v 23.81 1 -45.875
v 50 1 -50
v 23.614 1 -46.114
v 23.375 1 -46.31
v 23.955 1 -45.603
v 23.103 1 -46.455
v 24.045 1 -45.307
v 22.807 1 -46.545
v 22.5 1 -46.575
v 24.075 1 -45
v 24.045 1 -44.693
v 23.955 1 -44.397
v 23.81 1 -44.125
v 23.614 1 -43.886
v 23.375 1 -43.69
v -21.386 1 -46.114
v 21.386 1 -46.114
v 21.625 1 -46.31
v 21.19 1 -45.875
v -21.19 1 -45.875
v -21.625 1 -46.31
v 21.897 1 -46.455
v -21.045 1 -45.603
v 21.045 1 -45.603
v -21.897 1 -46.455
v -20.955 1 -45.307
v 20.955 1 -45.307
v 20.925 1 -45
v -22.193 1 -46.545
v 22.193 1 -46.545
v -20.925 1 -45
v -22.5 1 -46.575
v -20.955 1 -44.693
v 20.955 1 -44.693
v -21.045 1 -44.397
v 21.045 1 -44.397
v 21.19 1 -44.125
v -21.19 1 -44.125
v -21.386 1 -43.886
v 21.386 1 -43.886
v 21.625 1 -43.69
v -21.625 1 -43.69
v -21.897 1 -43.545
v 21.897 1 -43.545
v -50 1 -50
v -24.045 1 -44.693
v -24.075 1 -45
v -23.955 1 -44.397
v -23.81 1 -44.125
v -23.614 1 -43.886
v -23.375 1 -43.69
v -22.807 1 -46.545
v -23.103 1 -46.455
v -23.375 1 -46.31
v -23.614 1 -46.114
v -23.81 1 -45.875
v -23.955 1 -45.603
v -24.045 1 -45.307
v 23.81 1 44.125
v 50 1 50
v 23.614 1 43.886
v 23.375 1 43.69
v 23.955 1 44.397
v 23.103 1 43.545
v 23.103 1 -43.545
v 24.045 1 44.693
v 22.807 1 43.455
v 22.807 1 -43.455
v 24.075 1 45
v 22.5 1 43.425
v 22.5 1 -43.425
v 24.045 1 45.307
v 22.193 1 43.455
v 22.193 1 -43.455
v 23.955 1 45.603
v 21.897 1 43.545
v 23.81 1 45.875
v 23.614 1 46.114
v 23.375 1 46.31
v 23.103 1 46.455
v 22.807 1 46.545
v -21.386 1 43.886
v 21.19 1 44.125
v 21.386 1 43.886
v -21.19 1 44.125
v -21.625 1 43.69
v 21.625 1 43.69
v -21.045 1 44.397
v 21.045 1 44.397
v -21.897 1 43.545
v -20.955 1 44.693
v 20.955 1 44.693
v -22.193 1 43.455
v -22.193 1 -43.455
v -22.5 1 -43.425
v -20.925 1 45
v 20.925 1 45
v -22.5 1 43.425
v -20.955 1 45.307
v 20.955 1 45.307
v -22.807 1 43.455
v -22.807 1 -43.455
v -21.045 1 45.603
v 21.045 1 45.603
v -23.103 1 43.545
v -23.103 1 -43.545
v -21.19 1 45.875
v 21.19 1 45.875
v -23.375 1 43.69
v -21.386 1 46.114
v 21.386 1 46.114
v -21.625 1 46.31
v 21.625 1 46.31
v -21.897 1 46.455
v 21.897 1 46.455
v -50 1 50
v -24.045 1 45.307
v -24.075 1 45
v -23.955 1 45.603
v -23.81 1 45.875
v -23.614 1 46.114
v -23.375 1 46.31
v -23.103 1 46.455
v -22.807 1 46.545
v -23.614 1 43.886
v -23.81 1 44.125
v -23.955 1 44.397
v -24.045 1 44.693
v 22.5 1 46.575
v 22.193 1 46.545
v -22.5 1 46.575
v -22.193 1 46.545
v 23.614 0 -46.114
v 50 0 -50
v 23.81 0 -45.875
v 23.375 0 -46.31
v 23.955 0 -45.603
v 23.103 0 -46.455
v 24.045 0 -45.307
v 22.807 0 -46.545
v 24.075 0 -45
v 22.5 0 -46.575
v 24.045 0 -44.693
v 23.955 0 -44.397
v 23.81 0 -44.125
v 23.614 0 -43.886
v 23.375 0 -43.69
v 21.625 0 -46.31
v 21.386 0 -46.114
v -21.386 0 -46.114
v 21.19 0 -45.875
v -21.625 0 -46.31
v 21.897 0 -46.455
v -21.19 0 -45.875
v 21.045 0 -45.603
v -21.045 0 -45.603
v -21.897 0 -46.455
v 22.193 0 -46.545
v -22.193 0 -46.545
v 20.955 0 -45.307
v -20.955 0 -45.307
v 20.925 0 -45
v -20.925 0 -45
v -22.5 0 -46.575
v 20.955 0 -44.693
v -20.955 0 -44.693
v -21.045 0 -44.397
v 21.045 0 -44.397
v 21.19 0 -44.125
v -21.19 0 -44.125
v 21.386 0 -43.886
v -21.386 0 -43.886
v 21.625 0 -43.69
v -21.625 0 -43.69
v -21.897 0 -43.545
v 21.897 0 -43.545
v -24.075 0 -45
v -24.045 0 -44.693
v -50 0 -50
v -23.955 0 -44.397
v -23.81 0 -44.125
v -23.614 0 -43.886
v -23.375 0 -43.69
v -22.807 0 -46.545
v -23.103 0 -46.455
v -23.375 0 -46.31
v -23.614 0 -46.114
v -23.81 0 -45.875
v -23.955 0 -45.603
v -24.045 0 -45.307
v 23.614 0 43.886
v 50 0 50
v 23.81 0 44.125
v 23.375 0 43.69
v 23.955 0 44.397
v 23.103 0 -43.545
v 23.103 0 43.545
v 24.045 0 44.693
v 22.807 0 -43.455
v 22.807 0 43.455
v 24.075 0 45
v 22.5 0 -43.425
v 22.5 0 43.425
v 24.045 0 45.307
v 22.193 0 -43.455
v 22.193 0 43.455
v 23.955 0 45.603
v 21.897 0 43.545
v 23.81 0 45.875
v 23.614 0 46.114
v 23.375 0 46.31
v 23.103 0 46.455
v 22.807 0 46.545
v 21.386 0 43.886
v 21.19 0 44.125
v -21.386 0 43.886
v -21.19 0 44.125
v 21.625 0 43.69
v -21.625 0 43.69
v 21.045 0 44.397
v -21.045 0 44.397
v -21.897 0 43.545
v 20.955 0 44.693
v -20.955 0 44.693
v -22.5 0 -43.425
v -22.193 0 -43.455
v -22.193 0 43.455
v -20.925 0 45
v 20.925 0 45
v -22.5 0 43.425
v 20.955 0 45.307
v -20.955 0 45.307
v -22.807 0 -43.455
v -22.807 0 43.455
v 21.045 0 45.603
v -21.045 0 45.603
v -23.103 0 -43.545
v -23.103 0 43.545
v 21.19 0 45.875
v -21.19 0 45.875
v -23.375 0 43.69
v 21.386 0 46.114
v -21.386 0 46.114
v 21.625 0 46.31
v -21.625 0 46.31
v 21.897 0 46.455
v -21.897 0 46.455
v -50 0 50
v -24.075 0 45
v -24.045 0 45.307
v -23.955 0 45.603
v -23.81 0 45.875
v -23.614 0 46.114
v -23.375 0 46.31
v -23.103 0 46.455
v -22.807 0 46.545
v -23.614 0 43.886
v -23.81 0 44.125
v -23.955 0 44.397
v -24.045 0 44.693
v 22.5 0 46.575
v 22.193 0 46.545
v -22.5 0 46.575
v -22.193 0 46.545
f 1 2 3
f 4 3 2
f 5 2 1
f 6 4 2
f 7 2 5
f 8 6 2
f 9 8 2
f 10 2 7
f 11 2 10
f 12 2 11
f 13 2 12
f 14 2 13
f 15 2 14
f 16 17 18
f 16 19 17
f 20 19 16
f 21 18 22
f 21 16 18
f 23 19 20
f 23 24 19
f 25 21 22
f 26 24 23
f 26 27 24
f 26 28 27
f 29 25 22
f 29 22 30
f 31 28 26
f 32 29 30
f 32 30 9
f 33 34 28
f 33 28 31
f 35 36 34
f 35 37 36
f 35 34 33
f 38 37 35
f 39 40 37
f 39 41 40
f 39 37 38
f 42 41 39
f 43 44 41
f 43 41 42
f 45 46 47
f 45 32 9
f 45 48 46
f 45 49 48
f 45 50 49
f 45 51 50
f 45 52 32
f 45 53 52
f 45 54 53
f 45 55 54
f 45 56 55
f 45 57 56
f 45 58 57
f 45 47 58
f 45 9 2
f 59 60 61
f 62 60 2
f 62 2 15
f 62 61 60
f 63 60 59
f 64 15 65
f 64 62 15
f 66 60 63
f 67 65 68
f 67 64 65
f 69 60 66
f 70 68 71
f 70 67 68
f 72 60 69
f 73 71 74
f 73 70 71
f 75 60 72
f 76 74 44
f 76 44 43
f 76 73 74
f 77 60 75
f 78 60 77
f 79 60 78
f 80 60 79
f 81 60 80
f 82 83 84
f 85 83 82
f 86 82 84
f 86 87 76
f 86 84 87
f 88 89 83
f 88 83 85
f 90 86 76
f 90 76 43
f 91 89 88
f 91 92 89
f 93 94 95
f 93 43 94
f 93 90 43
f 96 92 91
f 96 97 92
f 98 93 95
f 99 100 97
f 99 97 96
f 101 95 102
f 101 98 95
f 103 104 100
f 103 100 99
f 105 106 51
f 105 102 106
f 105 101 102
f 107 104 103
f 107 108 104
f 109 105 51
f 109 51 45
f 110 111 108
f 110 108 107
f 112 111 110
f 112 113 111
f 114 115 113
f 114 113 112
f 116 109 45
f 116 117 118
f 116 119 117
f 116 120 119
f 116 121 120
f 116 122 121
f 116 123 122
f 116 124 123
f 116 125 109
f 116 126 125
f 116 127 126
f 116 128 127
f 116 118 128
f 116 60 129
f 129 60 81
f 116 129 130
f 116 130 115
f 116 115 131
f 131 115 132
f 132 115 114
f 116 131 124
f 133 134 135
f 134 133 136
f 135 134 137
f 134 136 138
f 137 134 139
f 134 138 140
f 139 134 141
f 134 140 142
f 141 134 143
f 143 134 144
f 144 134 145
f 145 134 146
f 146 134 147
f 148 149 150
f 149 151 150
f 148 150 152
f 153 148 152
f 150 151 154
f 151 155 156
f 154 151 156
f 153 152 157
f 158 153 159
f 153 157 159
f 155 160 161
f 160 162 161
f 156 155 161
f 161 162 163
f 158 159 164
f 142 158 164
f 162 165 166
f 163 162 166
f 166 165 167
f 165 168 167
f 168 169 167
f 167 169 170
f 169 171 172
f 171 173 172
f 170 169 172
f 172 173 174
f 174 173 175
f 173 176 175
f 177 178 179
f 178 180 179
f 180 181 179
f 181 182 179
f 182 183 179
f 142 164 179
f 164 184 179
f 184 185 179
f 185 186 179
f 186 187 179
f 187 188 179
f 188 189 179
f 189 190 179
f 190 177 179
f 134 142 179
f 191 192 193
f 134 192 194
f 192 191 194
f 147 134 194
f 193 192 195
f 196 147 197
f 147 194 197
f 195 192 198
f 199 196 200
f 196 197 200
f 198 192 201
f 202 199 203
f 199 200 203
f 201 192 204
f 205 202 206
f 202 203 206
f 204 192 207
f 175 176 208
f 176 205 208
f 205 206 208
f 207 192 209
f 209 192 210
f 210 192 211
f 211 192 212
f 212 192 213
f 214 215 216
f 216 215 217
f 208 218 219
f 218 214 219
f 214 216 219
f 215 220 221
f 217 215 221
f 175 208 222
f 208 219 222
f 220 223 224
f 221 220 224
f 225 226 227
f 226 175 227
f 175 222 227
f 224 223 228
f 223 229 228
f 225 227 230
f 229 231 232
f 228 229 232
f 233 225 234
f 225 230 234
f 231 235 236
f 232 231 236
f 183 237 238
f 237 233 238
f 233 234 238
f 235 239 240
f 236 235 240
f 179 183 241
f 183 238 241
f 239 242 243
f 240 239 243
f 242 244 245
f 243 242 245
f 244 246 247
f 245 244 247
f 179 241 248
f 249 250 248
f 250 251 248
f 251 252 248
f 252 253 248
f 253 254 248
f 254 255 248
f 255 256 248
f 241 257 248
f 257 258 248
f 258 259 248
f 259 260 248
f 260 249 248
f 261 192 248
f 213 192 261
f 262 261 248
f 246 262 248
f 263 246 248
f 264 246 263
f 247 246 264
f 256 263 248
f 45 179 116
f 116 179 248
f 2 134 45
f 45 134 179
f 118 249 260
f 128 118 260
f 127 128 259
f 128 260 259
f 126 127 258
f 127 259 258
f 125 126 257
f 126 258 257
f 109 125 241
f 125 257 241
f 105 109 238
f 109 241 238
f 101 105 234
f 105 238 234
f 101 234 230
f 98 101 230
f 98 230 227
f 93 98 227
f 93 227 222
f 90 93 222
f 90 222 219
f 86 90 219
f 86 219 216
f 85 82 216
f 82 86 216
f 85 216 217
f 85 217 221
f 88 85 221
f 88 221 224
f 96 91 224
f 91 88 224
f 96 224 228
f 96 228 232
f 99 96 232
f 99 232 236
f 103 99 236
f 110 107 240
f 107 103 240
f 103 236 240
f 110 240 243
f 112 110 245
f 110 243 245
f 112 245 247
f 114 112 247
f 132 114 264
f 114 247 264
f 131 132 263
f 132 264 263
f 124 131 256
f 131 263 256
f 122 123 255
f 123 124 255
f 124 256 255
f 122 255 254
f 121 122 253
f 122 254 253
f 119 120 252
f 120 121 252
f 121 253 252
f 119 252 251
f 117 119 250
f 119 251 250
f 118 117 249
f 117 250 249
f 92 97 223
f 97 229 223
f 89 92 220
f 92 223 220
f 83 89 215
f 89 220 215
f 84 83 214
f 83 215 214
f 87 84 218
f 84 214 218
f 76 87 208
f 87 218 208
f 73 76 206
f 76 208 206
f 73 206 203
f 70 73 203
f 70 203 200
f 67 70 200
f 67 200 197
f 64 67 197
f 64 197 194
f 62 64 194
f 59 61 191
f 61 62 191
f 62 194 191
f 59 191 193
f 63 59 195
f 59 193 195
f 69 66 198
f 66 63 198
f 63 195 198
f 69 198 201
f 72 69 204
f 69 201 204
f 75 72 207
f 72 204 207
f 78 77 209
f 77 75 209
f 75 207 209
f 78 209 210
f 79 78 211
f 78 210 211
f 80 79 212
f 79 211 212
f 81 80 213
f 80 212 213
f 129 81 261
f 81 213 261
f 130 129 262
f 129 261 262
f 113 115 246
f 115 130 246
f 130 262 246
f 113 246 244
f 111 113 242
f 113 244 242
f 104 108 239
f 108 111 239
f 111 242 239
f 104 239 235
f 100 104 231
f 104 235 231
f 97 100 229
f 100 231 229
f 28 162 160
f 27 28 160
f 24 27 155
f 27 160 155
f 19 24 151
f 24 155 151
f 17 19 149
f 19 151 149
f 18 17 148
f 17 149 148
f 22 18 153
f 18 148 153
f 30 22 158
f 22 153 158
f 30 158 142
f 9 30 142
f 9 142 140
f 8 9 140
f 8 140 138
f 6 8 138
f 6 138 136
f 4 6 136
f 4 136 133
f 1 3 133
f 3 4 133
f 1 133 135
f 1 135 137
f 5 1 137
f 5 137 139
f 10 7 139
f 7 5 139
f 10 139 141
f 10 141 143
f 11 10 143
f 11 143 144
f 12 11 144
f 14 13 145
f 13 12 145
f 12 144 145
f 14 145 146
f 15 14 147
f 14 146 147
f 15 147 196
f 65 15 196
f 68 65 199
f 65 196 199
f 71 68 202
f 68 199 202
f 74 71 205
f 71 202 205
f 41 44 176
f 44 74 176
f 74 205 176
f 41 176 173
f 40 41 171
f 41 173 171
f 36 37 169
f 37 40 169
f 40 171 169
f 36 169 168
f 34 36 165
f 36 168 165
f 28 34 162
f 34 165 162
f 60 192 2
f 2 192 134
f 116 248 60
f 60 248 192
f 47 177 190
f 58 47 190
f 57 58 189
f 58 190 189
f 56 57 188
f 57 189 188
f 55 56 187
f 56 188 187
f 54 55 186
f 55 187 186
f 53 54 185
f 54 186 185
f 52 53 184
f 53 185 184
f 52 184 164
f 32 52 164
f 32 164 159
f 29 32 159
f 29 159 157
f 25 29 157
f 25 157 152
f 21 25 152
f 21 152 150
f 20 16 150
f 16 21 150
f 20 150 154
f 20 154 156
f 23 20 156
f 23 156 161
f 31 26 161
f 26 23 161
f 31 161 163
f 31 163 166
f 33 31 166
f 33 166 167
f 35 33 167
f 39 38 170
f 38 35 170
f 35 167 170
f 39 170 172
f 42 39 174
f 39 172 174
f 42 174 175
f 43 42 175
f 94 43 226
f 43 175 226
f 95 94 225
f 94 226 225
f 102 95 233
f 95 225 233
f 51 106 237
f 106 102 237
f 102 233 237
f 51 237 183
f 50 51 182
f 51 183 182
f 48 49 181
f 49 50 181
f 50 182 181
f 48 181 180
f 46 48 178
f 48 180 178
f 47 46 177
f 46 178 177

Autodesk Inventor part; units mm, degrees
ref_plane "YZ Plane" through (0, 0, 0) normal (1, 0, 0) x (0, 1, 0)
ref_plane "XZ Plane" through (0, 0, 0) normal (0, 1, 0) x (-1, 0, 0)
ref_plane "XY Plane" through (0, 0, 0) normal (0, 0, 1) x (1, 0, 0)
sketch "Sketch3" plane through (0, 0, 0) normal (0, 1, 0) x (-1, 0, 0)
  line L0 (50, 50) -> (-50, 50)
  line L1 (-50, 50) -> (-50, -50)
  line L2 (-50, -50) -> (50, -50)
  line L3 (50, -50) -> (50, 50)
  line L4 (-50, -45) -> (50, -45) construction
  line L5 (-50, 45) -> (50, 45) construction
  line L6 (22.5, 50) -> (22.5, -50) construction
  line L7 (-22.5, 50) -> (-22.5, -50) construction
  circle A0 centre (-22.5, -45) radius 1.575
  circle A1 centre (-22.5, 45) radius 1.575
  circle A2 centre (22.5, 45) radius 1.575
  circle A3 centre (22.5, -45) radius 1.575
  point P0 (0, 0)
  dimension "d4" = 100
  dimension "d5" = 100
  dimension "d6" = 5
  dimension "d7" = 5
  dimension "d8" = 27.5
  dimension "d9" = 27.5
  dimension "d10" = 3.15
  dimension "d11" = 3.15
  dimension "d12" = 3.15
  dimension "d13" = 3.15
extrude "Extrusion1" add sketch "Sketch3" along normal blind 1
properties part number "CompCellScopeArray"
